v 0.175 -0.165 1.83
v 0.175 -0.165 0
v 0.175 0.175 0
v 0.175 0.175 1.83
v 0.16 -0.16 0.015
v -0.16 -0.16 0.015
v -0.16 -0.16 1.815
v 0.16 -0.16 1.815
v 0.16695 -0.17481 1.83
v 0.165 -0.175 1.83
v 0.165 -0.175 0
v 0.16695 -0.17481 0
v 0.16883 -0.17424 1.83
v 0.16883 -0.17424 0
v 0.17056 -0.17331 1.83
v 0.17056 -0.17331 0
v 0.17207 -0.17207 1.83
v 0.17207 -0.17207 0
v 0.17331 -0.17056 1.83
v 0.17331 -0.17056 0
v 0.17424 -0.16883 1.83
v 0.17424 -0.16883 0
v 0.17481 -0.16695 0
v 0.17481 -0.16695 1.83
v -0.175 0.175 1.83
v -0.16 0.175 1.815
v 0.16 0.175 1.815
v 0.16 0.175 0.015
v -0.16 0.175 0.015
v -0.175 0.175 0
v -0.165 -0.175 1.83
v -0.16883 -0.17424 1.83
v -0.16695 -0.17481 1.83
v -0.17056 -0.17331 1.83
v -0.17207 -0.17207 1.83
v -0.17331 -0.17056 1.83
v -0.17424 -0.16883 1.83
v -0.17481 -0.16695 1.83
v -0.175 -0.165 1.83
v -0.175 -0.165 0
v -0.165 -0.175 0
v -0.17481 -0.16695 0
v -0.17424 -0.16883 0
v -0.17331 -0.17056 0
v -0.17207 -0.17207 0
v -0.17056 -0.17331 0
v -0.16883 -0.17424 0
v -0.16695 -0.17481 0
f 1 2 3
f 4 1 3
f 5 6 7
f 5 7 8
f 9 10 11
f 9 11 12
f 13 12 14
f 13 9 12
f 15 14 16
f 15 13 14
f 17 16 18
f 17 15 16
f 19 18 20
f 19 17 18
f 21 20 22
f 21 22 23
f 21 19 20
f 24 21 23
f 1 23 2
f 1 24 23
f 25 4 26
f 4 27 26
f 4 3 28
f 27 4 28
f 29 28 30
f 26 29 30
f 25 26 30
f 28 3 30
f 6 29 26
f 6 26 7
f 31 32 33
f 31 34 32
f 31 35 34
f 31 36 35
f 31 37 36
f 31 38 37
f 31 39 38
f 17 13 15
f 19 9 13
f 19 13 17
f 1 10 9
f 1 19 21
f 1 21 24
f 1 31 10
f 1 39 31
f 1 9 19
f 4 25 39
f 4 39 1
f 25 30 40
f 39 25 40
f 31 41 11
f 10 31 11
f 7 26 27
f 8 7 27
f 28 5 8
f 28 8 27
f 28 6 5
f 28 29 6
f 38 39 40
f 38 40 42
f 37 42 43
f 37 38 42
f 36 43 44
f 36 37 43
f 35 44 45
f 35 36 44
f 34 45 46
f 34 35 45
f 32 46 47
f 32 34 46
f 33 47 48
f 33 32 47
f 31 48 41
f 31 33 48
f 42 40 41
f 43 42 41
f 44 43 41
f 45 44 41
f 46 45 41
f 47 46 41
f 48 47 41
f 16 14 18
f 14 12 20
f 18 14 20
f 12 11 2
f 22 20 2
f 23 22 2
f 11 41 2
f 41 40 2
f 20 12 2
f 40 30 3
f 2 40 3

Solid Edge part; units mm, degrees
sketch "Sketch1" plane through (0, 0, 0) normal (0, 0, 1) x (1, 0, 0)
  line L0 (-0.175, -0.175) -> (0.175, -0.175)
  line L1 (0.175, -0.175) -> (0.175, 0.175)
  line L2 (0.175, 0.175) -> (-0.175, 0.175)
  line L3 (-0.175, 0.175) -> (-0.175, -0.175)
  dimension "D1" = 0.35
  dimension "D2" = 0.35
extrude "Protrusion1" add sketch "Sketch1" along normal blind 1.83
sketch "Sketch2" plane through (0, 0, 1.83) normal (0, 0, 1) x (1, 0, 0)
  line L0 (-0.175, -0.165) -> (-0.175, -0.2285)
  line L1 (0.175, -0.2285) -> (-0.175, -0.2285)
  line L2 (0.175, -0.165) -> (0.175, -0.2285)
  arc A0 (0.165, -0.175) -> (0.175, -0.165) centre (0.165, -0.165) ccw
  line L3 (0.165, -0.175) -> (-0.165, -0.175)
  arc A1 (-0.165, -0.175) -> (-0.175, -0.165) centre (-0.165, -0.165) cw
extrude "Cutout1" cut sketch "Sketch2" against normal through all
shell "Dünnwand_1" thickness 0.015 removed faces 1 at (0.1202, 0.175, 1.5067)
